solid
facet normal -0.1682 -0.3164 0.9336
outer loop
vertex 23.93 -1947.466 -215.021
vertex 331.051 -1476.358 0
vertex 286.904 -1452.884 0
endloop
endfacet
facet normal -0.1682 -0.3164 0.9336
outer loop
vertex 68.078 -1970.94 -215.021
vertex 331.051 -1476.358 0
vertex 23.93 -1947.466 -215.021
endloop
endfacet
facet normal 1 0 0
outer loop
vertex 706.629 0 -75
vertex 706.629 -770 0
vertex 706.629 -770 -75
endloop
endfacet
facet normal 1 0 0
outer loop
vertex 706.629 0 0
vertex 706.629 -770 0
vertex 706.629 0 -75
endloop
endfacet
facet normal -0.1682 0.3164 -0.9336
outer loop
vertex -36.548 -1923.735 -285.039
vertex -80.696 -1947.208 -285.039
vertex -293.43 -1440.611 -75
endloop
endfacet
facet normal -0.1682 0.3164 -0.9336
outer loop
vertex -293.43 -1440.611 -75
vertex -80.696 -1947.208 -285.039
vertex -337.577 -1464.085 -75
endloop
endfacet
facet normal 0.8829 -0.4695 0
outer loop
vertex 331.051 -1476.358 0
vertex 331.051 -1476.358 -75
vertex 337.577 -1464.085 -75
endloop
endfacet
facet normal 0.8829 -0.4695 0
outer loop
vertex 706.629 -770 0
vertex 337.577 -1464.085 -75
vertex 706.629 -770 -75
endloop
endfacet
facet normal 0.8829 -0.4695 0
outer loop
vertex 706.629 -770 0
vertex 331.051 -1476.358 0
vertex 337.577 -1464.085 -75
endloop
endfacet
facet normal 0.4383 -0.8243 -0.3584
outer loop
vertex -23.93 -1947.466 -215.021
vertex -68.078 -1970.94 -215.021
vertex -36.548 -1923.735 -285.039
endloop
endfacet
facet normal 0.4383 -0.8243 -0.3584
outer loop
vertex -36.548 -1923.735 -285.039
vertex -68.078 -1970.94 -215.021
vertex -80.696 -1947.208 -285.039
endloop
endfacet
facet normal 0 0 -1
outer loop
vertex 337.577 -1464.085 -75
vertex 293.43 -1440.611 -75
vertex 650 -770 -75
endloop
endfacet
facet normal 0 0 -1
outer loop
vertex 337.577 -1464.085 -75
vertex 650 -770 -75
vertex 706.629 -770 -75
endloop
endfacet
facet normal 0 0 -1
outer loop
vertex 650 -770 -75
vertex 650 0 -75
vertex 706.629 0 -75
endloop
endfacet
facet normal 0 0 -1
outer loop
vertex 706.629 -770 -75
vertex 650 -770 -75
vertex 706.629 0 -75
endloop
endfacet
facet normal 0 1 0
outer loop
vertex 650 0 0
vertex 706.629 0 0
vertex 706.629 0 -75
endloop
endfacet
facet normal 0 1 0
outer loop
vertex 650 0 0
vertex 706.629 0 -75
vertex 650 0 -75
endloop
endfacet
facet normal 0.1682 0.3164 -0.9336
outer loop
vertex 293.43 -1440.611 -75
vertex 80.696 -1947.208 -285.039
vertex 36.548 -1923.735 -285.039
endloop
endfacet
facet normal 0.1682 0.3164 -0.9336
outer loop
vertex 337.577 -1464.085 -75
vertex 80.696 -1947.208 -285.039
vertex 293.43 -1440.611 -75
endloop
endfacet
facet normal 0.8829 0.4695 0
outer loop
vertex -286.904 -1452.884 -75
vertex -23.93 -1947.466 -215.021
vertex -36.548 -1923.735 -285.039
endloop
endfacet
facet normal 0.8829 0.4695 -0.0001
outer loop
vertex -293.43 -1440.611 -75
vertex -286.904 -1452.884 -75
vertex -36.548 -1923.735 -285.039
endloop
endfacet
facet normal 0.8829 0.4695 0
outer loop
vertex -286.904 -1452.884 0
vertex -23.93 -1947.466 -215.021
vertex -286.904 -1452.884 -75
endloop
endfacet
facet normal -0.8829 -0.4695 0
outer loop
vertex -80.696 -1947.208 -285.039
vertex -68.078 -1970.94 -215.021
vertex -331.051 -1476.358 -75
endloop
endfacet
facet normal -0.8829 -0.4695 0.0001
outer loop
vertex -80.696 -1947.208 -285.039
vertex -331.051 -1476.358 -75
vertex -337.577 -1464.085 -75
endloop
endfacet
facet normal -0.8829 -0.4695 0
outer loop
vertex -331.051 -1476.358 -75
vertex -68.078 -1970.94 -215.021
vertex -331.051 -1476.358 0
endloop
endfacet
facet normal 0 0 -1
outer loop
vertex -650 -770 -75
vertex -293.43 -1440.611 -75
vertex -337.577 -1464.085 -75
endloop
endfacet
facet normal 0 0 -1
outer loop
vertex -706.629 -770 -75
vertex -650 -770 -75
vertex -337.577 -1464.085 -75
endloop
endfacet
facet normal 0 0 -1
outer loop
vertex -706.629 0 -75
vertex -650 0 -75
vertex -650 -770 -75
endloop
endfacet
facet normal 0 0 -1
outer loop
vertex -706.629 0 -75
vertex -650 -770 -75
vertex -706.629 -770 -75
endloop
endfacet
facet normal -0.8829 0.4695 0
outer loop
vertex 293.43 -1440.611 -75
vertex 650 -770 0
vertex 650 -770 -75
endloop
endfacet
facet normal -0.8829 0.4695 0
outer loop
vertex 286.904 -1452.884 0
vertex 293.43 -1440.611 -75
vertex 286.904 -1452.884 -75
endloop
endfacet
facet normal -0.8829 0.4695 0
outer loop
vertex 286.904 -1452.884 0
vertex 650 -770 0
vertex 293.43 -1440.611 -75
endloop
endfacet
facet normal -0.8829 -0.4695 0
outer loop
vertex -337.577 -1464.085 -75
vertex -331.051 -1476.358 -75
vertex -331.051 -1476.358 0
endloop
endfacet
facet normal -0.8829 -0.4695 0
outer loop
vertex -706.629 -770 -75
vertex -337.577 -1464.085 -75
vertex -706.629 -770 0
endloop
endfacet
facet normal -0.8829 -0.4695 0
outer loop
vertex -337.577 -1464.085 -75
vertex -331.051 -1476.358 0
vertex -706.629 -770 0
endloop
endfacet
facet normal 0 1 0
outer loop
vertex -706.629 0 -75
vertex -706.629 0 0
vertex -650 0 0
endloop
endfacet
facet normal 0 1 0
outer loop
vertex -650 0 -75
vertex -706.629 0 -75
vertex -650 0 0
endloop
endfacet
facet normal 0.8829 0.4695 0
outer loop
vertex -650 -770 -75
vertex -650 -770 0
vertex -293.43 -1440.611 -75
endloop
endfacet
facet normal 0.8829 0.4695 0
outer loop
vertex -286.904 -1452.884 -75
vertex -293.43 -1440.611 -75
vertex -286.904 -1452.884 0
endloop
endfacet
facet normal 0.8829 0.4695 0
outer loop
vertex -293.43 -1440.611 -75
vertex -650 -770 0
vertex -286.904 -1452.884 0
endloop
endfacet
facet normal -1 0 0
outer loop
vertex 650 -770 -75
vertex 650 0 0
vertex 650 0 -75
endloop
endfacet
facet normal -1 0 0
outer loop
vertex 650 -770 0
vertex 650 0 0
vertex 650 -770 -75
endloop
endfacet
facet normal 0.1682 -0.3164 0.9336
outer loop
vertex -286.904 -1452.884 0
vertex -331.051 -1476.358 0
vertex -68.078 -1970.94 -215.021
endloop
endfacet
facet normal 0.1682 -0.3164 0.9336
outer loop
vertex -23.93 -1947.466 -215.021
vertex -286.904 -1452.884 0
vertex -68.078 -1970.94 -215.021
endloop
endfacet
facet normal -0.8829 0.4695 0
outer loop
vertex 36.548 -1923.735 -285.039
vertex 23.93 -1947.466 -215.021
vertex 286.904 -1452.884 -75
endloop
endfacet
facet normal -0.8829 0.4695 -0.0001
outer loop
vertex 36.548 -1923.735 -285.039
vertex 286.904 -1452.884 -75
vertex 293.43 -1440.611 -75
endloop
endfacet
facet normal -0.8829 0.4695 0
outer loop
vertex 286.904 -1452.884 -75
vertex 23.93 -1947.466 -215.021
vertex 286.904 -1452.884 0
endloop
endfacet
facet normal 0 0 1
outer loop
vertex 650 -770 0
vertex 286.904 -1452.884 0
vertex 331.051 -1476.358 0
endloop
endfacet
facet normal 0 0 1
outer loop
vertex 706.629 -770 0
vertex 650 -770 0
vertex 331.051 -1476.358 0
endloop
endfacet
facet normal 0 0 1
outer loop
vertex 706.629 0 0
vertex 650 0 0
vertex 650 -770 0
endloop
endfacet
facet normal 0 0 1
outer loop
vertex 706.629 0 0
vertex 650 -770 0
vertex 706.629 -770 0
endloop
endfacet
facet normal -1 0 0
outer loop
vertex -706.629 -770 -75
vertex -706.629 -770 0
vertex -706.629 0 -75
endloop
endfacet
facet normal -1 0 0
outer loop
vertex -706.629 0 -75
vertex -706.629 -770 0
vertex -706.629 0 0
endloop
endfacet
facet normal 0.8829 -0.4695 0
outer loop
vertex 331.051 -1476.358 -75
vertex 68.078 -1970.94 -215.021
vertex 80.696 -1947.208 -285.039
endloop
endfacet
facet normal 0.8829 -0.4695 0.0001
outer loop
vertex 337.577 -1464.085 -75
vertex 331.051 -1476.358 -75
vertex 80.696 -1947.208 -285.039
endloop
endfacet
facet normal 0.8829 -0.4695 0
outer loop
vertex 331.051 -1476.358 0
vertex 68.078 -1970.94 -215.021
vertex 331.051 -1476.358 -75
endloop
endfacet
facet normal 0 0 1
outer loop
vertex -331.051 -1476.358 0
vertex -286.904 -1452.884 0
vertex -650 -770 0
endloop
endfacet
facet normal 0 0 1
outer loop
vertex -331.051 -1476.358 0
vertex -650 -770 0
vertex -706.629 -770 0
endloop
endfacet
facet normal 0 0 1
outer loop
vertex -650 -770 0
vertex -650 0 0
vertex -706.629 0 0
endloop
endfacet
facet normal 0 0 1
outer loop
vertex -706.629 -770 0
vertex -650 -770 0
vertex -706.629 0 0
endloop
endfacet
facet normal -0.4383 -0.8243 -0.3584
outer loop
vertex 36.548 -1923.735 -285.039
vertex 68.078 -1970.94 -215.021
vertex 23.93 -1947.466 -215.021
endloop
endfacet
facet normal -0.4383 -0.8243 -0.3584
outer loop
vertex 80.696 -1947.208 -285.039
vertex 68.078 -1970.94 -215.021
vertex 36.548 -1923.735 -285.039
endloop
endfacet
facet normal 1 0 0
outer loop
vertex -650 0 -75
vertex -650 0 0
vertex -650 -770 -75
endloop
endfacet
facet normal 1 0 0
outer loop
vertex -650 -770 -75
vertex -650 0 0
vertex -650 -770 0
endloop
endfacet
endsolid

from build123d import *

# Parameters (mm, degrees)
F1_DEPTH = 75
F4_DEPTH = 50


with BuildPart() as f1:
    # F0 (on Top) → F1 (new body)
    with BuildSketch(Plane.XY):
        Polygon((706.6285025345, 0), (650, 0), (650, -770), (286.9038726628, -1452.8844961478), (331.0512523057, -1476.3580742871), (706.6285025345, -770), align=None)
    extrude(amount=-F1_DEPTH)

    # F3 (on offset) → F4 (join)
    with BuildSketch(Plane(origin=(870.0645387046, -462.6215213834, 0), x_dir=(0.4694715628, 0.8829475929, 0), z_dir=(0.8829475929, -0.4694715628, 0))):
        Polygon((-1126.1462356104, -71.8979966034), (-1148.1276591075, 0), (-1708.2759150058, -215.0207697272), (-1681.3983187899, -285.0393017145), align=None)
    extrude(amount=-F4_DEPTH)


with BuildPart() as f6_1:
    # F6: instance of F1
    add(f1.part.mirror(Plane.YZ))


solid = Compound([f1.part, f6_1.part])
